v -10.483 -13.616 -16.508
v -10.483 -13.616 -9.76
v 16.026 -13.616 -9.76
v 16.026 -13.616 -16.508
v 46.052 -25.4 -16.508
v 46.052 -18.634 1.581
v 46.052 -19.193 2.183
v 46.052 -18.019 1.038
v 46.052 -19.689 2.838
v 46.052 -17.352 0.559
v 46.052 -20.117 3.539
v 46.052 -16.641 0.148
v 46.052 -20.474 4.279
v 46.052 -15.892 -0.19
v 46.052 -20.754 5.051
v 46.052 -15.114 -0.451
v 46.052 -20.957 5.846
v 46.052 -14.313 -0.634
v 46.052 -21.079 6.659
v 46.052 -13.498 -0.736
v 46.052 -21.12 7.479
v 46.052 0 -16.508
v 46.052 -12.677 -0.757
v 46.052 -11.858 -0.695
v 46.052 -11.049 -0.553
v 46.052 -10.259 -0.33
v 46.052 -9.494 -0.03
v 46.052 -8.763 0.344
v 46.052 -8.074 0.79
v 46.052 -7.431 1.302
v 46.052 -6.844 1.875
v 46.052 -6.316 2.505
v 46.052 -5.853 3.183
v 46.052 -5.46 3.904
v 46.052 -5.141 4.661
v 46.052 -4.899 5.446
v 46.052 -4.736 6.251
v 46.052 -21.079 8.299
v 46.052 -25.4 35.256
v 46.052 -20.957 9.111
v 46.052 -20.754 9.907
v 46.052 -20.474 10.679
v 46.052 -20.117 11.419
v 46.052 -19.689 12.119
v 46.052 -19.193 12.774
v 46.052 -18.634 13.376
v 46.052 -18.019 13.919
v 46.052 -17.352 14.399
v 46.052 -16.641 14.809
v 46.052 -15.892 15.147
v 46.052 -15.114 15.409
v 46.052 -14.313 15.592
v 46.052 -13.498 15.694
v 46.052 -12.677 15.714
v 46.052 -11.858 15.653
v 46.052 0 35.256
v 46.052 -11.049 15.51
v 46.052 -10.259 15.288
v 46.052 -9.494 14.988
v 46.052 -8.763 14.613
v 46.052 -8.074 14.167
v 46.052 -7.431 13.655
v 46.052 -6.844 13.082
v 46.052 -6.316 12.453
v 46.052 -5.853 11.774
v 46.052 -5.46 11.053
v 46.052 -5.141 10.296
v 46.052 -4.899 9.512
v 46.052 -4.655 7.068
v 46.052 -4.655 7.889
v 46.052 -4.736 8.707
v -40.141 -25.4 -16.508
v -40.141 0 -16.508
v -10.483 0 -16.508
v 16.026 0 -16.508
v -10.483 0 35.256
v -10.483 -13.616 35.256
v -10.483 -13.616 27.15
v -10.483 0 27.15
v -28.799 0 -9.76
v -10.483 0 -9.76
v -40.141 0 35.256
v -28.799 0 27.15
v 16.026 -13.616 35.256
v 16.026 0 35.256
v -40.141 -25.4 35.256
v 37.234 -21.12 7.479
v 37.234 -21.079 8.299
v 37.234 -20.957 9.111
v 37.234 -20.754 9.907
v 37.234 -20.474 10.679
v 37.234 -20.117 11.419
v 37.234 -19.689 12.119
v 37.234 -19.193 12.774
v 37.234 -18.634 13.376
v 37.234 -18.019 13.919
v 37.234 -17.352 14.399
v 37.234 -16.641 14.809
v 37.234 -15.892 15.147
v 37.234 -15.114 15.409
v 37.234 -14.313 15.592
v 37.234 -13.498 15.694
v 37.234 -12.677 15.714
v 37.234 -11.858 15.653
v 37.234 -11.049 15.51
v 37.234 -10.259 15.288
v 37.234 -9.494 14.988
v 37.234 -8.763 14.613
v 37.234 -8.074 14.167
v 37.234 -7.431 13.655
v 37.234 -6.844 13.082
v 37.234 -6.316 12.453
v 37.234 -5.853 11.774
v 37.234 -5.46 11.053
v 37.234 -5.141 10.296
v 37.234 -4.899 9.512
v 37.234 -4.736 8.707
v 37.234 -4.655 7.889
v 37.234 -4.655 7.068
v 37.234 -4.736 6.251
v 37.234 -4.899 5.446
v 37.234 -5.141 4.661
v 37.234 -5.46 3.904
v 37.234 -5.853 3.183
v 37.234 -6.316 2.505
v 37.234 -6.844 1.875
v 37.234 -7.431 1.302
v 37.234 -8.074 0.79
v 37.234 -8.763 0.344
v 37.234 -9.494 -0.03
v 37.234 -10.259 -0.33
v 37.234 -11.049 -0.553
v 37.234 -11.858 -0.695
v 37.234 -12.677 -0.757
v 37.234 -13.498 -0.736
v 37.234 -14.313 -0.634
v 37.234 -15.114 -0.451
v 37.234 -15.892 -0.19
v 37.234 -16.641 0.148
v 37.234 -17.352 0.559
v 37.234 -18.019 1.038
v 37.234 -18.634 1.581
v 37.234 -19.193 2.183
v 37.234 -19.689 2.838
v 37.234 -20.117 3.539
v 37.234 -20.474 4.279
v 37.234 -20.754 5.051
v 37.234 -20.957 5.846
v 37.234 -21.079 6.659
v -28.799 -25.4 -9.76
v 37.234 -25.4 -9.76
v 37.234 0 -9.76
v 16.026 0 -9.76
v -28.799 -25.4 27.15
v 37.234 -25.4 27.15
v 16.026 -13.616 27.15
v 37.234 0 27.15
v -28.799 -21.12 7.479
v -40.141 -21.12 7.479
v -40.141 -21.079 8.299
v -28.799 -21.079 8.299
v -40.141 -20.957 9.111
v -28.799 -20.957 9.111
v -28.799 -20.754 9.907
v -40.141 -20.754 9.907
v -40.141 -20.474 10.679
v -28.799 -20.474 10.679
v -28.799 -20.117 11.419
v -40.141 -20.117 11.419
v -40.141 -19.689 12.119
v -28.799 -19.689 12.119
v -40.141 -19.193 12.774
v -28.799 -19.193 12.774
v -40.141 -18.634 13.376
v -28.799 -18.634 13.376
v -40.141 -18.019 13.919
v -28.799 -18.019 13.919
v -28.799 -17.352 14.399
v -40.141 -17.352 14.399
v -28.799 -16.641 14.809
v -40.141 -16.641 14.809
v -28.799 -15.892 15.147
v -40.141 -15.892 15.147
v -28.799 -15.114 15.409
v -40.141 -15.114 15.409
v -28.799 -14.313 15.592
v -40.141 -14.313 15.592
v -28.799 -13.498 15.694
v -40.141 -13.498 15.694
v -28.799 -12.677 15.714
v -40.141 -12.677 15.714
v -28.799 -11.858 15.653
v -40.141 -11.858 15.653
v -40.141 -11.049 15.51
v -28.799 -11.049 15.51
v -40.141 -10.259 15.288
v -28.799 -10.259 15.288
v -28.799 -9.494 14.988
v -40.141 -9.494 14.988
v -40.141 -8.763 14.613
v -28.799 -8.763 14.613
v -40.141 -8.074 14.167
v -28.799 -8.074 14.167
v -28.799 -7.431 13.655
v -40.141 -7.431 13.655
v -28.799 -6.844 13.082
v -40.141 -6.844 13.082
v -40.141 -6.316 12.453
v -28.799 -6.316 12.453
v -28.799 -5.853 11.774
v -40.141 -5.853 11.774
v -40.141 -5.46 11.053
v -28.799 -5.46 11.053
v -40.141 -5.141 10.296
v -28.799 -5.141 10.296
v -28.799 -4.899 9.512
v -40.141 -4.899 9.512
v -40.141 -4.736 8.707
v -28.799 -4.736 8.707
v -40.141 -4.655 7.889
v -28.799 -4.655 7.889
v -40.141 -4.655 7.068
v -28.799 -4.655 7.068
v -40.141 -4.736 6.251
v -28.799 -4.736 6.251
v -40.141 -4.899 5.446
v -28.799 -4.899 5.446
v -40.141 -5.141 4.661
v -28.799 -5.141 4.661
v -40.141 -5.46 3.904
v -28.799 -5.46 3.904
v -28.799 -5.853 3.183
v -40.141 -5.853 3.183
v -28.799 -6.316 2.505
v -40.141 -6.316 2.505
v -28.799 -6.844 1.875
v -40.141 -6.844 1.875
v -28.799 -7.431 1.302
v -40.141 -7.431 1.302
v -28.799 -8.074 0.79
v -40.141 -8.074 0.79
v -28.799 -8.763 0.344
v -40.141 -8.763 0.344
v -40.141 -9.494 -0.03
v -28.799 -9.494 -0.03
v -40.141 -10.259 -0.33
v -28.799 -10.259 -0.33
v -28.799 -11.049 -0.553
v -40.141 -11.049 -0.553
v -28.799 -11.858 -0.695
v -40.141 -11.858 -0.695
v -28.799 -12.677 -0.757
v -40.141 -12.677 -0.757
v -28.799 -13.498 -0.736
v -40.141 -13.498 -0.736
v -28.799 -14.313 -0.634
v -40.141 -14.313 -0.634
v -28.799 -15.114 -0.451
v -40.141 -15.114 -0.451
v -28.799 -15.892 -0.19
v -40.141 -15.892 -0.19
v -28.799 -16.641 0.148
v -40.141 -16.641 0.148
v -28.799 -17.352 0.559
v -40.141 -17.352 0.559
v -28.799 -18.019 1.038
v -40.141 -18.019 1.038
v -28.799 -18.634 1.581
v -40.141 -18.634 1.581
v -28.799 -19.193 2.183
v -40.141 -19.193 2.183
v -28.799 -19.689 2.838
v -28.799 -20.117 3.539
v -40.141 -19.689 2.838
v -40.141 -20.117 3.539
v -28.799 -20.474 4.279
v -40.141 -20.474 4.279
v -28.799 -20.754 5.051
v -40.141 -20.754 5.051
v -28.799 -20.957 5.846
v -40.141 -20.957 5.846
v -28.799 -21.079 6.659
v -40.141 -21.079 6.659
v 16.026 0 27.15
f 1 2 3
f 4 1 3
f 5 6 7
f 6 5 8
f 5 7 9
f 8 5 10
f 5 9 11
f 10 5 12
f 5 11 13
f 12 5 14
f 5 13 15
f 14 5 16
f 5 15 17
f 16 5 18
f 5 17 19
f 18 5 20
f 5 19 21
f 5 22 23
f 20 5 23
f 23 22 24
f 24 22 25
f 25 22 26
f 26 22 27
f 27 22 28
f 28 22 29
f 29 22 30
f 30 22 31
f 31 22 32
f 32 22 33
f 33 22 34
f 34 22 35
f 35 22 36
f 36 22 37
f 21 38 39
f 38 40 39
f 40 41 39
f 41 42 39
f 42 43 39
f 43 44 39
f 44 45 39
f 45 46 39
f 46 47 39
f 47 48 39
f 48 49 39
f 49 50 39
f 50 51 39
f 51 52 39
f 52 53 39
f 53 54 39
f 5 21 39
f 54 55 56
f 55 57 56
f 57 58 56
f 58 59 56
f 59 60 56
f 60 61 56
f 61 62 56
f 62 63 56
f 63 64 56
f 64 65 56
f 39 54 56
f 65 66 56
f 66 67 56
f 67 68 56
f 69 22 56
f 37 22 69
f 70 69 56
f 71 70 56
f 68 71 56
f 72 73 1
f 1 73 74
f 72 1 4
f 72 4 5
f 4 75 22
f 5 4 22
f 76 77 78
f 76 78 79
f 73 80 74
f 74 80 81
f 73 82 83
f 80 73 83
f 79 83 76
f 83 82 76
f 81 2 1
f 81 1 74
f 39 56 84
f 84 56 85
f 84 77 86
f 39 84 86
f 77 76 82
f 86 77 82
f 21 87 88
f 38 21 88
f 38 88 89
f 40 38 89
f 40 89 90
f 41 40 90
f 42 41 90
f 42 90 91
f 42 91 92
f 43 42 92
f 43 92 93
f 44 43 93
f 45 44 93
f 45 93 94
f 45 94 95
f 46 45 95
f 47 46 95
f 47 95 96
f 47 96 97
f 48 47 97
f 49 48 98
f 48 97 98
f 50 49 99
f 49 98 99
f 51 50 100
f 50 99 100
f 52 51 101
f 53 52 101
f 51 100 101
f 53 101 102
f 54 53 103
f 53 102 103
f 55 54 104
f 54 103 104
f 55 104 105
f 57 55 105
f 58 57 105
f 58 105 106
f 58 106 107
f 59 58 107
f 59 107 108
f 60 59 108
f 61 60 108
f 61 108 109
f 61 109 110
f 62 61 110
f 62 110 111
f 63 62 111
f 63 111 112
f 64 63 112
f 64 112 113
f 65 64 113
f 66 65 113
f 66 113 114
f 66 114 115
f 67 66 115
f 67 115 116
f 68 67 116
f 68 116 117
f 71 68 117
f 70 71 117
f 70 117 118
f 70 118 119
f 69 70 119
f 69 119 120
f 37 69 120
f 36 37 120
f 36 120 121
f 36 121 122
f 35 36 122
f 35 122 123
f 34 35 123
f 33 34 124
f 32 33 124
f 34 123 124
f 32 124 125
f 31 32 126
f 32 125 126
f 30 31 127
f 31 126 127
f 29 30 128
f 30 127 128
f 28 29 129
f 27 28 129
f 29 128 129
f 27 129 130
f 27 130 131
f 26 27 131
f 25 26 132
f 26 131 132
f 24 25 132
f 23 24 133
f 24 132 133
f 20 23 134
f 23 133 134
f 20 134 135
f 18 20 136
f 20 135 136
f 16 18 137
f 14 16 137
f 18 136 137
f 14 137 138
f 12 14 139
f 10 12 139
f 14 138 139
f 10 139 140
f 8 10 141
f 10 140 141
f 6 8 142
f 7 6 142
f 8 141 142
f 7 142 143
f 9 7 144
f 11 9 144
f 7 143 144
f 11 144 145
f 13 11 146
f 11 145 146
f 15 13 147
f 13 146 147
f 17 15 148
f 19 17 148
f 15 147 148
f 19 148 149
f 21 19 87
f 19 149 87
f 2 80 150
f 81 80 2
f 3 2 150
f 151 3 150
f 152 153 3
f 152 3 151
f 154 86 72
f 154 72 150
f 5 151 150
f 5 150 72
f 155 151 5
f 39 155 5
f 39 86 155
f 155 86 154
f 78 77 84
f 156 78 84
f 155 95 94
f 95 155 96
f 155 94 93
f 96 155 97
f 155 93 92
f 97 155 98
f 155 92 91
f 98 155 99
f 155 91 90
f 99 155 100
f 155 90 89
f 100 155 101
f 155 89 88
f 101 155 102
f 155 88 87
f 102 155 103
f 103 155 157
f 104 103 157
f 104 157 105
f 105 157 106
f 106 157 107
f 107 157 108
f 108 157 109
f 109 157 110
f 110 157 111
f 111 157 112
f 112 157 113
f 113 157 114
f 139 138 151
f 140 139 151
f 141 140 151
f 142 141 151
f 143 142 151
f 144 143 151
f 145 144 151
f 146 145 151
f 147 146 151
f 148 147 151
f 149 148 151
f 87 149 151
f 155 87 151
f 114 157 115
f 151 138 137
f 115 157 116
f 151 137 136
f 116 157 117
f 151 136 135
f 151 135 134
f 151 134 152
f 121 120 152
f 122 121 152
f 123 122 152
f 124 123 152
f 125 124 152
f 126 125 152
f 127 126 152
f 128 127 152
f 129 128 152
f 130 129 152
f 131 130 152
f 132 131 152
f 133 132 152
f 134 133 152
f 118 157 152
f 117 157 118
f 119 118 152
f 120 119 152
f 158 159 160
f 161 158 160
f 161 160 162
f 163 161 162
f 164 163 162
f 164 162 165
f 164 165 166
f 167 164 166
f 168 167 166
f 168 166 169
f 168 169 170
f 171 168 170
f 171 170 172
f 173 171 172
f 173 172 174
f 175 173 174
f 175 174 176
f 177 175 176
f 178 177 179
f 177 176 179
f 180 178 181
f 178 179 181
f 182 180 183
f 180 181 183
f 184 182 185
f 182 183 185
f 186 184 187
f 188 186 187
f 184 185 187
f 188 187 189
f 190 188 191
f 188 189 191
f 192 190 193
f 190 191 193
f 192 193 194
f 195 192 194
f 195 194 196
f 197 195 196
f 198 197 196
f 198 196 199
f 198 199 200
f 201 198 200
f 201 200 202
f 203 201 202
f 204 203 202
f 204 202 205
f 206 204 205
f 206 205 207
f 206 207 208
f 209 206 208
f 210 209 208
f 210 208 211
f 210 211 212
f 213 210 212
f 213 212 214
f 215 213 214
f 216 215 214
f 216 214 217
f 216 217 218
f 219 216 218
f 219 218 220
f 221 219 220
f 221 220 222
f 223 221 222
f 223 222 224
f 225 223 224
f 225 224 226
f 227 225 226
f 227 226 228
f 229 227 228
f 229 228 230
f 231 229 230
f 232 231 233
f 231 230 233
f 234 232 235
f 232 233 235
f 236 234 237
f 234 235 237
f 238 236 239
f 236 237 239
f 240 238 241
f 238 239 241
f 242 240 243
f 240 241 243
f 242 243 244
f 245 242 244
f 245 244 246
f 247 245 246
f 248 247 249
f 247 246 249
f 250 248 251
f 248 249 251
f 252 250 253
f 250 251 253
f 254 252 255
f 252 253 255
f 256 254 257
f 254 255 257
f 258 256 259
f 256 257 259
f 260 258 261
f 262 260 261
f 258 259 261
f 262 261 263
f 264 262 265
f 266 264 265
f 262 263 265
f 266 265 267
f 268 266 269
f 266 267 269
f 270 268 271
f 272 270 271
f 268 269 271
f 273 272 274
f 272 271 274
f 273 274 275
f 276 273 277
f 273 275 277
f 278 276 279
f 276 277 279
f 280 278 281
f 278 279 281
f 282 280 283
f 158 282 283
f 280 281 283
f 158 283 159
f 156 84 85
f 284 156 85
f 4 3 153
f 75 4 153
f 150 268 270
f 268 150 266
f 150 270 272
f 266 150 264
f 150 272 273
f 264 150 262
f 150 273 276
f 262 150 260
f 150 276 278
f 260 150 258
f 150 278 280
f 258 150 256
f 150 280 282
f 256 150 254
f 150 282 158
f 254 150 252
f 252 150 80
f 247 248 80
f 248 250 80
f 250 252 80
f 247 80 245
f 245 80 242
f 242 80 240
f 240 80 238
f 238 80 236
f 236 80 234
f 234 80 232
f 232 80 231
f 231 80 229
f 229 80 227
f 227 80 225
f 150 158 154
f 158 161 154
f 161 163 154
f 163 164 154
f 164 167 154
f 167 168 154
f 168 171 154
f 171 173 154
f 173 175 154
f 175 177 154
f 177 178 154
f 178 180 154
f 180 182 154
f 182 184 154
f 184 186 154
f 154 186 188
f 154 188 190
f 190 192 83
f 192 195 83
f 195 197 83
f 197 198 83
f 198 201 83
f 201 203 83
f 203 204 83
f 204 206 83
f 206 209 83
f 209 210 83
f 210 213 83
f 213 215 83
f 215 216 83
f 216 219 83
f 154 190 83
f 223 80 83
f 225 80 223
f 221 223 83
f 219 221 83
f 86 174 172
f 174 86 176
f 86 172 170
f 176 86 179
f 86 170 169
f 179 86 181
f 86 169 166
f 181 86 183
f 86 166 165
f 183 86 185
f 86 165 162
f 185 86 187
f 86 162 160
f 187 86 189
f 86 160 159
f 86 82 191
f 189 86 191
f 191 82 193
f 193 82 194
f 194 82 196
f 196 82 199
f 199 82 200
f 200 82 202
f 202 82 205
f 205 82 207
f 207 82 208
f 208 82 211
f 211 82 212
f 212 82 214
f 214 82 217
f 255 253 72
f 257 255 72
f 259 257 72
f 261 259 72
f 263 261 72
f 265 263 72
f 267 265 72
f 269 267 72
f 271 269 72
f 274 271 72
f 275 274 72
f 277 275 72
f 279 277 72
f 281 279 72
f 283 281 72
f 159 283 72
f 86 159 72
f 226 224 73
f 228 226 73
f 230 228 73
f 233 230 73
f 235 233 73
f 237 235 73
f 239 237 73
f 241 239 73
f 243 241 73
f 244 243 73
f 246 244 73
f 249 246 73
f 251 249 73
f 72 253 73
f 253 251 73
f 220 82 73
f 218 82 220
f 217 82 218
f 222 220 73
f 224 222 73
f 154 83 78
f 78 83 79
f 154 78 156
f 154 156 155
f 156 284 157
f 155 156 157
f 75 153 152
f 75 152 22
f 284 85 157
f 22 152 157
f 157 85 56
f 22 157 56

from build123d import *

# Parameters (mm, degrees)
F0_W     = 66.0323537886
F0_H     = 6.7478315905
F1_DEPTH = 25.4
F2_DEPTH = 25.4
F3_W     = 26.5093389899
F3_H     = 13.6161595583
F4_DEPTH = 76.454
F5_R     = 8.2379774364
F6_DEPTH = 155.194


with BuildPart() as f1:
    # F0 (on Front) → F1 (new body)
    with BuildSketch(Plane.XZ):
        Polygon((-40.1414297521, 27.1496288478), (-28.7987813354, 27.1496288478), (37.2335724533, 27.1496288478), (37.2335724533, 35.2556668222), (-40.1414297521, 35.2556668222), align=None)
        with Locations((4.217395559, -13.1341717206)):
            Rectangle(F0_W, F0_H)
        Polygon((-40.1414297521, -16.5080875158), (-28.7987813354, -16.5080875158), (-28.7987813354, -9.7602559254), (-28.7987813354, 27.1496288478), (-40.1414297521, 27.1496288478), align=None)
        Polygon((37.2335724533, -9.7602559254), (37.2335724533, -16.5080875158), (46.05165869, -16.5080875158), (46.05165869, 35.2556668222), (37.2335724533, 35.2556668222), (37.2335724533, 27.1496288478), align=None)
    extrude(amount=F1_DEPTH)

    # F0 (on Front) → F2 (join)
    with BuildSketch(Plane.XZ):
        Polygon((-40.1414297521, 27.1496288478), (-28.7987813354, 27.1496288478), (37.2335724533, 27.1496288478), (37.2335724533, 35.2556668222), (-40.1414297521, 35.2556668222), align=None)
        with Locations((4.217395559, -13.1341717206)):
            Rectangle(F0_W, F0_H)
        Polygon((-40.1414297521, -16.5080875158), (-28.7987813354, -16.5080875158), (-28.7987813354, -9.7602559254), (-28.7987813354, 27.1496288478), (-40.1414297521, 27.1496288478), align=None)
        Polygon((37.2335724533, -9.7602559254), (37.2335724533, -16.5080875158), (46.05165869, -16.5080875158), (46.05165869, 35.2556668222), (37.2335724533, 35.2556668222), (37.2335724533, 27.1496288478), align=None)
    extrude(amount=F2_DEPTH)

    # F3 (on face) → F4 (cut)
    with BuildSketch(Plane.XY.offset(35.2556668222)):
        with Locations((2.7714306489, -6.8080797791)):
            Rectangle(F3_W, F3_H)
    extrude(amount=-F4_DEPTH, mode=Mode.SUBTRACT)

    # F5 (on face) → F6 (cut)
    with BuildSketch(Plane(origin=(-40.1414297521, 0, 0), x_dir=(0, -1, 0), z_dir=(-1, 0, 0))):
        with Locations((12.8824114799, 7.4787386693)):
            Circle(F5_R)
    extrude(amount=-F6_DEPTH, mode=Mode.SUBTRACT)


solid = f1.part
